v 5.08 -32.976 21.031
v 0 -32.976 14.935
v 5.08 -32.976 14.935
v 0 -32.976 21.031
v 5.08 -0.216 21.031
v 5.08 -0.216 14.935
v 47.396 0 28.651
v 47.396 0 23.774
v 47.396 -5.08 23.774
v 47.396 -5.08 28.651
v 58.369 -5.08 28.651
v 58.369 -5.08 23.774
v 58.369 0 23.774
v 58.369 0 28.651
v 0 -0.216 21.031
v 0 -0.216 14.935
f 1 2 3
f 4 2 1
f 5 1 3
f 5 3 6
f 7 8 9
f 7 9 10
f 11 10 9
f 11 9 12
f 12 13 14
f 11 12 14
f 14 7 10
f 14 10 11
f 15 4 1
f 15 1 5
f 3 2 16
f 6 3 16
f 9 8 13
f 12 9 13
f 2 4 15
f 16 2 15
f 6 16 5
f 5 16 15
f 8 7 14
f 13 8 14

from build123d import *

# Parameters (mm, degrees)
F0_W     = 32.759979
F0_H     = 6.096
F1_DEPTH = 5.08
F2_W     = 10.972798
F2_H     = 4.8768
F3_DEPTH = 5.08


with BuildPart() as f1:
    # F0 (on Right) → F1 (new body)
    with BuildSketch(Plane.YZ):
        with Locations((-16.595512, 17.9832)):
            Rectangle(F0_W, F0_H)
    extrude(amount=F1_DEPTH)


with BuildPart() as f3:
    # F2 (on Front) → F3 (new body)
    with BuildSketch(Plane.XZ):
        with Locations((52.882802, 26.2128)):
            Rectangle(F2_W, F2_H)
    extrude(amount=F3_DEPTH)


solid = Compound([f1.part, f3.part])
